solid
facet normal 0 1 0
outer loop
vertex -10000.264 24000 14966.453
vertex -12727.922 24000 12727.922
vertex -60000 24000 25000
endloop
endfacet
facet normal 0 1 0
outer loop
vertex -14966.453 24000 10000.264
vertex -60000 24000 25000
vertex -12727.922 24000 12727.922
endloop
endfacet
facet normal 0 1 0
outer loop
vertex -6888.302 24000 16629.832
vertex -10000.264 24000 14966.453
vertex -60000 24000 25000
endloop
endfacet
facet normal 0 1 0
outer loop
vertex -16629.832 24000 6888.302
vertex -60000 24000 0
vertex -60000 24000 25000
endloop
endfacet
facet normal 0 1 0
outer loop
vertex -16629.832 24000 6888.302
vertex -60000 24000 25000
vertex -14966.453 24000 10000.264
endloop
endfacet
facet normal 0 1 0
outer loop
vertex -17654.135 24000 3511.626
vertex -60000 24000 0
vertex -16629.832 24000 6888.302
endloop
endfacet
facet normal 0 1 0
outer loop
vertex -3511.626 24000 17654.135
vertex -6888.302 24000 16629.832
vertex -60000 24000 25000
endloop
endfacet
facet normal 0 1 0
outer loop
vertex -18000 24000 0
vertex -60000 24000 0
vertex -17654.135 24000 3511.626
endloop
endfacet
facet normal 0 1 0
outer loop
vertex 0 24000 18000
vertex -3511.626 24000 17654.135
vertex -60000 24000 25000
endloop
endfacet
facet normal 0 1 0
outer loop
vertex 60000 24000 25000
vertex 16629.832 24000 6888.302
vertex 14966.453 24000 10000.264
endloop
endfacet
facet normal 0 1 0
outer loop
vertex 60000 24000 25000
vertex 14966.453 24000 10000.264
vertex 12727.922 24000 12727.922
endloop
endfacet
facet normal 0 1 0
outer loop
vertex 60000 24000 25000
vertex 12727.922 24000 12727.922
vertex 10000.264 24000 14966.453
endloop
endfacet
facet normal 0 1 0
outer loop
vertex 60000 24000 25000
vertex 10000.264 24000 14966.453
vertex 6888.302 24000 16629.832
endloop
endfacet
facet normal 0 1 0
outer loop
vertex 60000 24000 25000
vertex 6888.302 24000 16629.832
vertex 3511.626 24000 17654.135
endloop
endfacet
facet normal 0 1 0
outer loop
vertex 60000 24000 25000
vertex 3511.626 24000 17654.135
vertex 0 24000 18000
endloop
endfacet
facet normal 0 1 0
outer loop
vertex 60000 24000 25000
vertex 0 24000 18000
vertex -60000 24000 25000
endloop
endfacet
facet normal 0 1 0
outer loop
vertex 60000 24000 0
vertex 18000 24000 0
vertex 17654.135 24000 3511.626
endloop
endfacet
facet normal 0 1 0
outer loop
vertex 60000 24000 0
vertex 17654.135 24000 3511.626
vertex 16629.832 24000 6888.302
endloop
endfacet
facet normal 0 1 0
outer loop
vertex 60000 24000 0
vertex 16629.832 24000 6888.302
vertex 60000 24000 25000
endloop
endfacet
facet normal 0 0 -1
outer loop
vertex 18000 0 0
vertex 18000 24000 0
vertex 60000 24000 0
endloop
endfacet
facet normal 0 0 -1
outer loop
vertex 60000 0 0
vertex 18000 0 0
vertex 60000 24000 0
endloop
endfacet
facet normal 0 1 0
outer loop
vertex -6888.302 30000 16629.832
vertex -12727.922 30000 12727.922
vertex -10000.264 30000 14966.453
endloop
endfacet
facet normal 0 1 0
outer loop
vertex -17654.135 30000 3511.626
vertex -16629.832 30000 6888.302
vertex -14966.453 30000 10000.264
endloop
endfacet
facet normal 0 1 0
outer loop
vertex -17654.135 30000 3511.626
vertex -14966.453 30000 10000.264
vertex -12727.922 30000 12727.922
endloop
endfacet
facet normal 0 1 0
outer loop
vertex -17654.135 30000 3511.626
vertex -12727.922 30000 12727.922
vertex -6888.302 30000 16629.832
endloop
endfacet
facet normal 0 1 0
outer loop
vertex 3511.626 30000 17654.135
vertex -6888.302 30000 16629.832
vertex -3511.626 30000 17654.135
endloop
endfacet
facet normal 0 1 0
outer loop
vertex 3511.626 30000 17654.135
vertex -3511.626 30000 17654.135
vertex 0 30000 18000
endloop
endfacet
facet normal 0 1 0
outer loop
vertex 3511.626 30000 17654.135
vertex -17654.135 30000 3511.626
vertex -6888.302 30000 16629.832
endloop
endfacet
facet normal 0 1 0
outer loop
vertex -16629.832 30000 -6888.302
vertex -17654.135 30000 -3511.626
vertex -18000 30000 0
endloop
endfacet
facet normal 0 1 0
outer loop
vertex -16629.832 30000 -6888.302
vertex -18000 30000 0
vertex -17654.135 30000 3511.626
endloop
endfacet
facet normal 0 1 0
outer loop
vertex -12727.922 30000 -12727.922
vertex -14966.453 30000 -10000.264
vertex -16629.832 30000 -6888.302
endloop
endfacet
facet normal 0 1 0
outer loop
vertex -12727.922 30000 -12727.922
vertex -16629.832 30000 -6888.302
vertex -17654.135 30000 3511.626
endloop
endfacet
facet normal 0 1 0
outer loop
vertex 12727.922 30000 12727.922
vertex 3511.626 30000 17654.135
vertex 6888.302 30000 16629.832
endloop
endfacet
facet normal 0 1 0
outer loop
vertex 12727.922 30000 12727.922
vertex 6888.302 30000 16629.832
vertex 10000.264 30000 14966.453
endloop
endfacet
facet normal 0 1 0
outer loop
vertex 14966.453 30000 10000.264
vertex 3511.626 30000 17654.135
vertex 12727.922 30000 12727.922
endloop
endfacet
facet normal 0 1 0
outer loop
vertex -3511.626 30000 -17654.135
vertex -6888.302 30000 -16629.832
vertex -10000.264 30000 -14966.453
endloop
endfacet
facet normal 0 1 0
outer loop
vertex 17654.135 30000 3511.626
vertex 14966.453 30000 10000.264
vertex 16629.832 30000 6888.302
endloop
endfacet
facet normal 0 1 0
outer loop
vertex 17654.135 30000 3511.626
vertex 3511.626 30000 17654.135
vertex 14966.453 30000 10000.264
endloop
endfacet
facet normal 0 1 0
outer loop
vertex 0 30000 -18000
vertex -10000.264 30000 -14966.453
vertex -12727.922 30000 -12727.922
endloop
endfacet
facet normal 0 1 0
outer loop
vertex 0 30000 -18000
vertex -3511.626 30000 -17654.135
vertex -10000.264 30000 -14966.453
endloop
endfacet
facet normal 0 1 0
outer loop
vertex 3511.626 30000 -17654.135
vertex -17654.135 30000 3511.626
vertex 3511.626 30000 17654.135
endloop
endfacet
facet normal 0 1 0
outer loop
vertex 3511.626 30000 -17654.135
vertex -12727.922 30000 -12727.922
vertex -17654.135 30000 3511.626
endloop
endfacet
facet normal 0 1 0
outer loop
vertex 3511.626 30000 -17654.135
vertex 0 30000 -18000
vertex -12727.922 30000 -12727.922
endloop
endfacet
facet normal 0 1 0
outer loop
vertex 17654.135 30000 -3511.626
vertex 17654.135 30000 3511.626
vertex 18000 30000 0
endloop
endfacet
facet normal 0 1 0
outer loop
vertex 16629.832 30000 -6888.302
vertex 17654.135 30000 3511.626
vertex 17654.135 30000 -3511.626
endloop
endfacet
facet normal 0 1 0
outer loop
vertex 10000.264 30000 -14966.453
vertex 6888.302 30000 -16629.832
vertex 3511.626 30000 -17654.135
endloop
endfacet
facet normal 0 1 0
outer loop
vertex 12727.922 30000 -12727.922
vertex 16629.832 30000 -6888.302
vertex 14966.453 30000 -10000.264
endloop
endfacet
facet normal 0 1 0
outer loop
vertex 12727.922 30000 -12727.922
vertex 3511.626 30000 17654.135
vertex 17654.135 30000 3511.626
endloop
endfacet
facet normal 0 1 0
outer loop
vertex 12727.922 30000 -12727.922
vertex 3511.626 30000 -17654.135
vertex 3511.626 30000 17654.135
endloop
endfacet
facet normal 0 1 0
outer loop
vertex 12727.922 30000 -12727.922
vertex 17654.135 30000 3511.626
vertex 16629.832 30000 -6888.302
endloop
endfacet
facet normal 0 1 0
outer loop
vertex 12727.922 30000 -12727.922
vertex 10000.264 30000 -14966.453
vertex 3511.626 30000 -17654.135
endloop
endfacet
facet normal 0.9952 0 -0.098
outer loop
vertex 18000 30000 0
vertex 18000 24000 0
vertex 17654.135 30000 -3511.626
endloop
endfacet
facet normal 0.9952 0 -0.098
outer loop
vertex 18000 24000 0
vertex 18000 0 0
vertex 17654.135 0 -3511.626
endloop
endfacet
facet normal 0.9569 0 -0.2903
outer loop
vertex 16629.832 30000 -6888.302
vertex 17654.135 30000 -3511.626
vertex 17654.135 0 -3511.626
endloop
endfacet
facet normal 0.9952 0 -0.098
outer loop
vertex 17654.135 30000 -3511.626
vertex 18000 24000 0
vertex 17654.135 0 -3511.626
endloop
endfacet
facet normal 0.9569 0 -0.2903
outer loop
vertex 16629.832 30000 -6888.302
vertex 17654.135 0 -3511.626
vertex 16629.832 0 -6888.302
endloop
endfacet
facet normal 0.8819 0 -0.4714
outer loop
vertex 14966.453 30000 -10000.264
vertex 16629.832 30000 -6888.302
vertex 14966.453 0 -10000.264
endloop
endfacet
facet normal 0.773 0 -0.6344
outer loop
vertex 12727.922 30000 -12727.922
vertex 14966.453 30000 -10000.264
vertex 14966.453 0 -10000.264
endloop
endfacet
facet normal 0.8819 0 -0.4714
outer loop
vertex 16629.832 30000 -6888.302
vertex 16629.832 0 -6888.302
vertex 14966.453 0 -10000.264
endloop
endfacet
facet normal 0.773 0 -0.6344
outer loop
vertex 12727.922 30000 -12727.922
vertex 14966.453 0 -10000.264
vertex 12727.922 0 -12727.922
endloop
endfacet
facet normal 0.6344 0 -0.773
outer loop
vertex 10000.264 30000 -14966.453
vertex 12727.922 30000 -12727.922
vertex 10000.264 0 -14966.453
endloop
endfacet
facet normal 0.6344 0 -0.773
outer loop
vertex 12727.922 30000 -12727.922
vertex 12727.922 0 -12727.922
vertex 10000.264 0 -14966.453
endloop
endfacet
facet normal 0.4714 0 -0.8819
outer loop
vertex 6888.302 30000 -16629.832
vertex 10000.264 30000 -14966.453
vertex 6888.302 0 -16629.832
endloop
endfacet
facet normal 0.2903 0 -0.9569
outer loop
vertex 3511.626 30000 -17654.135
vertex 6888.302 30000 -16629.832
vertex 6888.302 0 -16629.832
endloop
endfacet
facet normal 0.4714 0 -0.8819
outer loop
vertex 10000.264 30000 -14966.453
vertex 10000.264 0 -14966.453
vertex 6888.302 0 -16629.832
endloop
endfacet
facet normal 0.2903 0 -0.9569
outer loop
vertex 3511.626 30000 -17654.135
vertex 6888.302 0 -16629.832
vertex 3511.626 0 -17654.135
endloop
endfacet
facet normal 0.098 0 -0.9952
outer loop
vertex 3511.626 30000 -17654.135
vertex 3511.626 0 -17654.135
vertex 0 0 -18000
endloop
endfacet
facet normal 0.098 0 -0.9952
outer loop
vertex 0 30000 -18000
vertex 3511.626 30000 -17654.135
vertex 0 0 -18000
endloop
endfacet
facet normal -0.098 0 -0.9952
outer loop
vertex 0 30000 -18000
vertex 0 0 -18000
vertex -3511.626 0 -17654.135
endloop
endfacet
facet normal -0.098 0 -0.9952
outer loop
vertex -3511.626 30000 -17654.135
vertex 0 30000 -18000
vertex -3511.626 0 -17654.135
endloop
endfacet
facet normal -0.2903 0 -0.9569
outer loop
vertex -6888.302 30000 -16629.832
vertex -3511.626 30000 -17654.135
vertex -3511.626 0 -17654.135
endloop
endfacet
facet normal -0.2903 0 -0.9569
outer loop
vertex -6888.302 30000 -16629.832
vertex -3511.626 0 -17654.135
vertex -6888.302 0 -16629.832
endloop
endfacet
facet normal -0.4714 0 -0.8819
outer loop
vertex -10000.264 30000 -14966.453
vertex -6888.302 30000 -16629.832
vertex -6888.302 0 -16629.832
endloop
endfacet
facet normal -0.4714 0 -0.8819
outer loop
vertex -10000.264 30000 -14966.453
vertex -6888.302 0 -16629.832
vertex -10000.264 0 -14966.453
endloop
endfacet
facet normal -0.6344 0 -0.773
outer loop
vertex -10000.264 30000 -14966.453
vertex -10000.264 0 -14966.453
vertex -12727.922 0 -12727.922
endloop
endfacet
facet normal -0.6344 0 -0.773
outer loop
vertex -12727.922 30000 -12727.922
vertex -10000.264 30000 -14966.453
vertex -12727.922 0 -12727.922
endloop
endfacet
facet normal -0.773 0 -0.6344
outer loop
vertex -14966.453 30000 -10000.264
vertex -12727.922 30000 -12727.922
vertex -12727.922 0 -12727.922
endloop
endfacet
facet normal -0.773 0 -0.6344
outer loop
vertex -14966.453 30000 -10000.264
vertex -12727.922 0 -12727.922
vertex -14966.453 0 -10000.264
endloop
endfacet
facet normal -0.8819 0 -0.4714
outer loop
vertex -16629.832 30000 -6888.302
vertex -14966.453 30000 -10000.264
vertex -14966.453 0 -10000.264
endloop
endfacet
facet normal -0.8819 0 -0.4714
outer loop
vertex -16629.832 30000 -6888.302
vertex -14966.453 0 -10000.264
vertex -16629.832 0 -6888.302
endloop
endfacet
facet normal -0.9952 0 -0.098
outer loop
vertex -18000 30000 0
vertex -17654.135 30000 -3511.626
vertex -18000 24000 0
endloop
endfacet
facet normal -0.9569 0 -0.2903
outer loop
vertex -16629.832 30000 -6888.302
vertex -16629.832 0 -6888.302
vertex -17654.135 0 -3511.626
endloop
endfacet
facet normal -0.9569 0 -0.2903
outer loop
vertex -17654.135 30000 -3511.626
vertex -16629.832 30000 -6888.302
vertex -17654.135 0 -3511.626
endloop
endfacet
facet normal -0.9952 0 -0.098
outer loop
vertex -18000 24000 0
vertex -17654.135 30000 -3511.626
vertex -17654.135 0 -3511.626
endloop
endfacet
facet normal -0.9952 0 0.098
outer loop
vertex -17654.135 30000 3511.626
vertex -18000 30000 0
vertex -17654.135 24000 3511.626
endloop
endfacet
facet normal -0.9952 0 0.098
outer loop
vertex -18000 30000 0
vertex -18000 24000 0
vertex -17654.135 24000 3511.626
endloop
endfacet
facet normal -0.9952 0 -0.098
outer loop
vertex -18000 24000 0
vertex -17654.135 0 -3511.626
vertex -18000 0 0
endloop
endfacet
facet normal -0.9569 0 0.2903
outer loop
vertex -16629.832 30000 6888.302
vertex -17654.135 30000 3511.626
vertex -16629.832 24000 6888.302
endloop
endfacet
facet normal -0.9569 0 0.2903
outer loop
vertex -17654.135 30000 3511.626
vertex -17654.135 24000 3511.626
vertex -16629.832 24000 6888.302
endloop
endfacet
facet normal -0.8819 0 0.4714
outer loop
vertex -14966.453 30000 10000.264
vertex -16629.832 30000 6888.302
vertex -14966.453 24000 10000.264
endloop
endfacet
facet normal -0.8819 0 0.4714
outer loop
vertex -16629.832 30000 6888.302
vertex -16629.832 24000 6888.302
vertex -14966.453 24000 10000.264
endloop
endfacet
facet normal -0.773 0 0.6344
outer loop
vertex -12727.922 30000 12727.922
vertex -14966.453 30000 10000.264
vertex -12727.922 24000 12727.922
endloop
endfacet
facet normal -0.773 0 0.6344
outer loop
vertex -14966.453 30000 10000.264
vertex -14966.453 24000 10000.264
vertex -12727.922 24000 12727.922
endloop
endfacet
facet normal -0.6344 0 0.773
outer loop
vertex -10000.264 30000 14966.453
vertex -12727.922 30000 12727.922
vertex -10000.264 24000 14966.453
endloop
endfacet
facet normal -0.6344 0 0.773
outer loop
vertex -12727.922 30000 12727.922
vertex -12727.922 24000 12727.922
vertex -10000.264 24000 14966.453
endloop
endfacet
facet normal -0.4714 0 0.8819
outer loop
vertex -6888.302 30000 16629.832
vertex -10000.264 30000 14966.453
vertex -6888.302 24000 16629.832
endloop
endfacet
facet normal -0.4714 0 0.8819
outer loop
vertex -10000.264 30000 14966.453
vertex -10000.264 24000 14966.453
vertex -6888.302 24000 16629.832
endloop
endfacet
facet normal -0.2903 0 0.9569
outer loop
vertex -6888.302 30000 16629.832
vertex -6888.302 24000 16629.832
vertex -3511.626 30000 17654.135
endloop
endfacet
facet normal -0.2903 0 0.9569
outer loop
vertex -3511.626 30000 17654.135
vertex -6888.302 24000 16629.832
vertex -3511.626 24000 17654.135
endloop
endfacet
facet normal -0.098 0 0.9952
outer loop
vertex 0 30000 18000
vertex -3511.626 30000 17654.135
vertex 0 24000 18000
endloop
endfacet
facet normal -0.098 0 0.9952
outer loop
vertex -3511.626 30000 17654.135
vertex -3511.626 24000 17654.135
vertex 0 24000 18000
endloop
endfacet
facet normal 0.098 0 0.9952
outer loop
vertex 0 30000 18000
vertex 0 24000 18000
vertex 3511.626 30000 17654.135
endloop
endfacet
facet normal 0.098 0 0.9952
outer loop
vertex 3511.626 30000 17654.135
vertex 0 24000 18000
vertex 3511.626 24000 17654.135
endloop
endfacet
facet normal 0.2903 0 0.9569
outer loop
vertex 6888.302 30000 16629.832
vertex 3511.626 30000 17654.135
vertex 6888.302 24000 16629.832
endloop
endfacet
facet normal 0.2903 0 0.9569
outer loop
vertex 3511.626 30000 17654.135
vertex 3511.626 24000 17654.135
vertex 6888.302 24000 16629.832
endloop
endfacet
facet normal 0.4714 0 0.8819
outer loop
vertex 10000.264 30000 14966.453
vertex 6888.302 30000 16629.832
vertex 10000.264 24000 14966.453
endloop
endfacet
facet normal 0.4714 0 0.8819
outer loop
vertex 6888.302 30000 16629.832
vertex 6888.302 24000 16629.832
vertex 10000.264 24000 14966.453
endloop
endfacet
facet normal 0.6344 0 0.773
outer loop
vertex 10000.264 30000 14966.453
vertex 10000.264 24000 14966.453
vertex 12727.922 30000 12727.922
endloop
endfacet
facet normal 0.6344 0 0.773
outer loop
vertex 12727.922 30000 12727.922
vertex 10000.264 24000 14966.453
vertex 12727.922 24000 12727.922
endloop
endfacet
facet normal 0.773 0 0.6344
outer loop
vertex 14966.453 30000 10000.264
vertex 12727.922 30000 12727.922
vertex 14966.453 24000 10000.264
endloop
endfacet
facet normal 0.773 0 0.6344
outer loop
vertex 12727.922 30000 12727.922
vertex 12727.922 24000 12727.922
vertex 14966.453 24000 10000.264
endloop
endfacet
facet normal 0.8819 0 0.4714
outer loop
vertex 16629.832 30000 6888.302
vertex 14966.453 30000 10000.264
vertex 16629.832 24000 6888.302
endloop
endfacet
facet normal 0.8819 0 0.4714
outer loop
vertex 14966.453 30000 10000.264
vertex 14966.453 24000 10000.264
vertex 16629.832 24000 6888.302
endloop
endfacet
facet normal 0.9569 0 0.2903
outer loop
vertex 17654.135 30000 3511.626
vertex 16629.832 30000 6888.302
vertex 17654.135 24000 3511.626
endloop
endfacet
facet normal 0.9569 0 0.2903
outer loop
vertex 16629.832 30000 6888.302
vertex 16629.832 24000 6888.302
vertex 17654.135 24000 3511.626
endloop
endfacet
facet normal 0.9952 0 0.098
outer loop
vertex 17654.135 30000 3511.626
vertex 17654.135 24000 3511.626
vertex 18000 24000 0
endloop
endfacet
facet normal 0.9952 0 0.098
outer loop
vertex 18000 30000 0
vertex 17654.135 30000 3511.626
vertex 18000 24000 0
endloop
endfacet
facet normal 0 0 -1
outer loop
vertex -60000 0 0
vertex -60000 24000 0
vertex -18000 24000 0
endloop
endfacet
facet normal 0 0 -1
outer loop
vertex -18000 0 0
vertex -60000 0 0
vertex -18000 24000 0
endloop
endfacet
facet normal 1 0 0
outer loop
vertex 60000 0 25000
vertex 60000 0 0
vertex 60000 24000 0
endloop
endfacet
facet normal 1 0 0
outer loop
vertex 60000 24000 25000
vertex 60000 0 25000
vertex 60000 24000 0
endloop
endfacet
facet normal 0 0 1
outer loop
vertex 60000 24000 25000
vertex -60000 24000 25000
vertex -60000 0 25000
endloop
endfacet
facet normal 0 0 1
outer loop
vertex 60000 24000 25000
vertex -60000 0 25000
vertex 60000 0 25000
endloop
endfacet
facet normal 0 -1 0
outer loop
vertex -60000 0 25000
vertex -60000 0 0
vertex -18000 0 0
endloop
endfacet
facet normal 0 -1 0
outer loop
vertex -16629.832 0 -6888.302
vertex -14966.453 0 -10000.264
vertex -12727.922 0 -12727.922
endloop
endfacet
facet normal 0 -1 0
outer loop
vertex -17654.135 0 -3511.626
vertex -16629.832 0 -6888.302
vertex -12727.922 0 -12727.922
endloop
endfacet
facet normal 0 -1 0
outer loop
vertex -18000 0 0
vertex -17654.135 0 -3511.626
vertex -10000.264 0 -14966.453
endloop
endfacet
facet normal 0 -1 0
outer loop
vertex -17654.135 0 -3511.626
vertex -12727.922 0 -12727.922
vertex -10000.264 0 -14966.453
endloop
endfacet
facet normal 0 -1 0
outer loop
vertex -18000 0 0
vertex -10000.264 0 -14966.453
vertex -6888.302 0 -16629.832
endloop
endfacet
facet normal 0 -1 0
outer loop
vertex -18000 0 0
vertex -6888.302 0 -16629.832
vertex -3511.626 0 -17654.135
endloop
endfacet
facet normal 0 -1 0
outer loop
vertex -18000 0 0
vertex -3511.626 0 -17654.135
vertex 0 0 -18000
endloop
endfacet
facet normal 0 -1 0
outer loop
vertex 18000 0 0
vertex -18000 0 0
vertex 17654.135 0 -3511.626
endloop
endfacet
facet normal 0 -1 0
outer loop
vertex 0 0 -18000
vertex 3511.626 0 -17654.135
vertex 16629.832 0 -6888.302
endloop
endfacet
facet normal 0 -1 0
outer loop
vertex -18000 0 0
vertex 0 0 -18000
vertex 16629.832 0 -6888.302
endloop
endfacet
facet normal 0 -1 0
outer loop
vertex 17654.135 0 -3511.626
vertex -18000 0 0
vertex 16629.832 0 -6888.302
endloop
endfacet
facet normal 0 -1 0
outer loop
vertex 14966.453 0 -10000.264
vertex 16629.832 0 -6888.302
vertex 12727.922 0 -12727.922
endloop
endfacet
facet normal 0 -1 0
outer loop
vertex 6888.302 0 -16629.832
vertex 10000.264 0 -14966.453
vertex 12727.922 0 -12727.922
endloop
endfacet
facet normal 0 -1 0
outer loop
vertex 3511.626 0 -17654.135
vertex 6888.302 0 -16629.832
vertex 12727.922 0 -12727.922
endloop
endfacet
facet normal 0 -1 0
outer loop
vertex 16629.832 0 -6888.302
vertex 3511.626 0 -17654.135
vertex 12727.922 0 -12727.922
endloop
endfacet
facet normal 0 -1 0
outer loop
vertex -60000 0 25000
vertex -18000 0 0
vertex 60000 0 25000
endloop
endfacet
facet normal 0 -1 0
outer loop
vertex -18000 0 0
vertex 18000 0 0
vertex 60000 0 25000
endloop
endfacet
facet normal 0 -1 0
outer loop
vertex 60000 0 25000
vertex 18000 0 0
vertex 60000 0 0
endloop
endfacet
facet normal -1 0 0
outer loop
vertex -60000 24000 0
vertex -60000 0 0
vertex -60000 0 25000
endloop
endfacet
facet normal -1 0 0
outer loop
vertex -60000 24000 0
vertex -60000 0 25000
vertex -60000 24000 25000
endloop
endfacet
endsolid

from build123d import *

# Parameters (mm, degrees)
SKETCH_1_W      = 120000
SKETCH_1_H      = 24000
EXTRUDE_1_DEPTH = 25000
SKETCH_2_R      = 18000
EXTRUDE_2_DEPTH = 30000


with BuildPart() as part:
    # 草图1 → 凸台-拉伸1 (new body)
    with BuildSketch(Plane.XY):
        with Locations((0, 12000)):
            Rectangle(SKETCH_1_W, SKETCH_1_H)
    extrude(amount=EXTRUDE_1_DEPTH)

    # 草图2 → 凸台-拉伸2 (add)
    with BuildSketch(Plane(origin=(0, 0, 0), x_dir=(1, 0, 0), z_dir=(0, 1, 0))):
        Circle(SKETCH_2_R)
    extrude(amount=EXTRUDE_2_DEPTH)


solid = part.part
